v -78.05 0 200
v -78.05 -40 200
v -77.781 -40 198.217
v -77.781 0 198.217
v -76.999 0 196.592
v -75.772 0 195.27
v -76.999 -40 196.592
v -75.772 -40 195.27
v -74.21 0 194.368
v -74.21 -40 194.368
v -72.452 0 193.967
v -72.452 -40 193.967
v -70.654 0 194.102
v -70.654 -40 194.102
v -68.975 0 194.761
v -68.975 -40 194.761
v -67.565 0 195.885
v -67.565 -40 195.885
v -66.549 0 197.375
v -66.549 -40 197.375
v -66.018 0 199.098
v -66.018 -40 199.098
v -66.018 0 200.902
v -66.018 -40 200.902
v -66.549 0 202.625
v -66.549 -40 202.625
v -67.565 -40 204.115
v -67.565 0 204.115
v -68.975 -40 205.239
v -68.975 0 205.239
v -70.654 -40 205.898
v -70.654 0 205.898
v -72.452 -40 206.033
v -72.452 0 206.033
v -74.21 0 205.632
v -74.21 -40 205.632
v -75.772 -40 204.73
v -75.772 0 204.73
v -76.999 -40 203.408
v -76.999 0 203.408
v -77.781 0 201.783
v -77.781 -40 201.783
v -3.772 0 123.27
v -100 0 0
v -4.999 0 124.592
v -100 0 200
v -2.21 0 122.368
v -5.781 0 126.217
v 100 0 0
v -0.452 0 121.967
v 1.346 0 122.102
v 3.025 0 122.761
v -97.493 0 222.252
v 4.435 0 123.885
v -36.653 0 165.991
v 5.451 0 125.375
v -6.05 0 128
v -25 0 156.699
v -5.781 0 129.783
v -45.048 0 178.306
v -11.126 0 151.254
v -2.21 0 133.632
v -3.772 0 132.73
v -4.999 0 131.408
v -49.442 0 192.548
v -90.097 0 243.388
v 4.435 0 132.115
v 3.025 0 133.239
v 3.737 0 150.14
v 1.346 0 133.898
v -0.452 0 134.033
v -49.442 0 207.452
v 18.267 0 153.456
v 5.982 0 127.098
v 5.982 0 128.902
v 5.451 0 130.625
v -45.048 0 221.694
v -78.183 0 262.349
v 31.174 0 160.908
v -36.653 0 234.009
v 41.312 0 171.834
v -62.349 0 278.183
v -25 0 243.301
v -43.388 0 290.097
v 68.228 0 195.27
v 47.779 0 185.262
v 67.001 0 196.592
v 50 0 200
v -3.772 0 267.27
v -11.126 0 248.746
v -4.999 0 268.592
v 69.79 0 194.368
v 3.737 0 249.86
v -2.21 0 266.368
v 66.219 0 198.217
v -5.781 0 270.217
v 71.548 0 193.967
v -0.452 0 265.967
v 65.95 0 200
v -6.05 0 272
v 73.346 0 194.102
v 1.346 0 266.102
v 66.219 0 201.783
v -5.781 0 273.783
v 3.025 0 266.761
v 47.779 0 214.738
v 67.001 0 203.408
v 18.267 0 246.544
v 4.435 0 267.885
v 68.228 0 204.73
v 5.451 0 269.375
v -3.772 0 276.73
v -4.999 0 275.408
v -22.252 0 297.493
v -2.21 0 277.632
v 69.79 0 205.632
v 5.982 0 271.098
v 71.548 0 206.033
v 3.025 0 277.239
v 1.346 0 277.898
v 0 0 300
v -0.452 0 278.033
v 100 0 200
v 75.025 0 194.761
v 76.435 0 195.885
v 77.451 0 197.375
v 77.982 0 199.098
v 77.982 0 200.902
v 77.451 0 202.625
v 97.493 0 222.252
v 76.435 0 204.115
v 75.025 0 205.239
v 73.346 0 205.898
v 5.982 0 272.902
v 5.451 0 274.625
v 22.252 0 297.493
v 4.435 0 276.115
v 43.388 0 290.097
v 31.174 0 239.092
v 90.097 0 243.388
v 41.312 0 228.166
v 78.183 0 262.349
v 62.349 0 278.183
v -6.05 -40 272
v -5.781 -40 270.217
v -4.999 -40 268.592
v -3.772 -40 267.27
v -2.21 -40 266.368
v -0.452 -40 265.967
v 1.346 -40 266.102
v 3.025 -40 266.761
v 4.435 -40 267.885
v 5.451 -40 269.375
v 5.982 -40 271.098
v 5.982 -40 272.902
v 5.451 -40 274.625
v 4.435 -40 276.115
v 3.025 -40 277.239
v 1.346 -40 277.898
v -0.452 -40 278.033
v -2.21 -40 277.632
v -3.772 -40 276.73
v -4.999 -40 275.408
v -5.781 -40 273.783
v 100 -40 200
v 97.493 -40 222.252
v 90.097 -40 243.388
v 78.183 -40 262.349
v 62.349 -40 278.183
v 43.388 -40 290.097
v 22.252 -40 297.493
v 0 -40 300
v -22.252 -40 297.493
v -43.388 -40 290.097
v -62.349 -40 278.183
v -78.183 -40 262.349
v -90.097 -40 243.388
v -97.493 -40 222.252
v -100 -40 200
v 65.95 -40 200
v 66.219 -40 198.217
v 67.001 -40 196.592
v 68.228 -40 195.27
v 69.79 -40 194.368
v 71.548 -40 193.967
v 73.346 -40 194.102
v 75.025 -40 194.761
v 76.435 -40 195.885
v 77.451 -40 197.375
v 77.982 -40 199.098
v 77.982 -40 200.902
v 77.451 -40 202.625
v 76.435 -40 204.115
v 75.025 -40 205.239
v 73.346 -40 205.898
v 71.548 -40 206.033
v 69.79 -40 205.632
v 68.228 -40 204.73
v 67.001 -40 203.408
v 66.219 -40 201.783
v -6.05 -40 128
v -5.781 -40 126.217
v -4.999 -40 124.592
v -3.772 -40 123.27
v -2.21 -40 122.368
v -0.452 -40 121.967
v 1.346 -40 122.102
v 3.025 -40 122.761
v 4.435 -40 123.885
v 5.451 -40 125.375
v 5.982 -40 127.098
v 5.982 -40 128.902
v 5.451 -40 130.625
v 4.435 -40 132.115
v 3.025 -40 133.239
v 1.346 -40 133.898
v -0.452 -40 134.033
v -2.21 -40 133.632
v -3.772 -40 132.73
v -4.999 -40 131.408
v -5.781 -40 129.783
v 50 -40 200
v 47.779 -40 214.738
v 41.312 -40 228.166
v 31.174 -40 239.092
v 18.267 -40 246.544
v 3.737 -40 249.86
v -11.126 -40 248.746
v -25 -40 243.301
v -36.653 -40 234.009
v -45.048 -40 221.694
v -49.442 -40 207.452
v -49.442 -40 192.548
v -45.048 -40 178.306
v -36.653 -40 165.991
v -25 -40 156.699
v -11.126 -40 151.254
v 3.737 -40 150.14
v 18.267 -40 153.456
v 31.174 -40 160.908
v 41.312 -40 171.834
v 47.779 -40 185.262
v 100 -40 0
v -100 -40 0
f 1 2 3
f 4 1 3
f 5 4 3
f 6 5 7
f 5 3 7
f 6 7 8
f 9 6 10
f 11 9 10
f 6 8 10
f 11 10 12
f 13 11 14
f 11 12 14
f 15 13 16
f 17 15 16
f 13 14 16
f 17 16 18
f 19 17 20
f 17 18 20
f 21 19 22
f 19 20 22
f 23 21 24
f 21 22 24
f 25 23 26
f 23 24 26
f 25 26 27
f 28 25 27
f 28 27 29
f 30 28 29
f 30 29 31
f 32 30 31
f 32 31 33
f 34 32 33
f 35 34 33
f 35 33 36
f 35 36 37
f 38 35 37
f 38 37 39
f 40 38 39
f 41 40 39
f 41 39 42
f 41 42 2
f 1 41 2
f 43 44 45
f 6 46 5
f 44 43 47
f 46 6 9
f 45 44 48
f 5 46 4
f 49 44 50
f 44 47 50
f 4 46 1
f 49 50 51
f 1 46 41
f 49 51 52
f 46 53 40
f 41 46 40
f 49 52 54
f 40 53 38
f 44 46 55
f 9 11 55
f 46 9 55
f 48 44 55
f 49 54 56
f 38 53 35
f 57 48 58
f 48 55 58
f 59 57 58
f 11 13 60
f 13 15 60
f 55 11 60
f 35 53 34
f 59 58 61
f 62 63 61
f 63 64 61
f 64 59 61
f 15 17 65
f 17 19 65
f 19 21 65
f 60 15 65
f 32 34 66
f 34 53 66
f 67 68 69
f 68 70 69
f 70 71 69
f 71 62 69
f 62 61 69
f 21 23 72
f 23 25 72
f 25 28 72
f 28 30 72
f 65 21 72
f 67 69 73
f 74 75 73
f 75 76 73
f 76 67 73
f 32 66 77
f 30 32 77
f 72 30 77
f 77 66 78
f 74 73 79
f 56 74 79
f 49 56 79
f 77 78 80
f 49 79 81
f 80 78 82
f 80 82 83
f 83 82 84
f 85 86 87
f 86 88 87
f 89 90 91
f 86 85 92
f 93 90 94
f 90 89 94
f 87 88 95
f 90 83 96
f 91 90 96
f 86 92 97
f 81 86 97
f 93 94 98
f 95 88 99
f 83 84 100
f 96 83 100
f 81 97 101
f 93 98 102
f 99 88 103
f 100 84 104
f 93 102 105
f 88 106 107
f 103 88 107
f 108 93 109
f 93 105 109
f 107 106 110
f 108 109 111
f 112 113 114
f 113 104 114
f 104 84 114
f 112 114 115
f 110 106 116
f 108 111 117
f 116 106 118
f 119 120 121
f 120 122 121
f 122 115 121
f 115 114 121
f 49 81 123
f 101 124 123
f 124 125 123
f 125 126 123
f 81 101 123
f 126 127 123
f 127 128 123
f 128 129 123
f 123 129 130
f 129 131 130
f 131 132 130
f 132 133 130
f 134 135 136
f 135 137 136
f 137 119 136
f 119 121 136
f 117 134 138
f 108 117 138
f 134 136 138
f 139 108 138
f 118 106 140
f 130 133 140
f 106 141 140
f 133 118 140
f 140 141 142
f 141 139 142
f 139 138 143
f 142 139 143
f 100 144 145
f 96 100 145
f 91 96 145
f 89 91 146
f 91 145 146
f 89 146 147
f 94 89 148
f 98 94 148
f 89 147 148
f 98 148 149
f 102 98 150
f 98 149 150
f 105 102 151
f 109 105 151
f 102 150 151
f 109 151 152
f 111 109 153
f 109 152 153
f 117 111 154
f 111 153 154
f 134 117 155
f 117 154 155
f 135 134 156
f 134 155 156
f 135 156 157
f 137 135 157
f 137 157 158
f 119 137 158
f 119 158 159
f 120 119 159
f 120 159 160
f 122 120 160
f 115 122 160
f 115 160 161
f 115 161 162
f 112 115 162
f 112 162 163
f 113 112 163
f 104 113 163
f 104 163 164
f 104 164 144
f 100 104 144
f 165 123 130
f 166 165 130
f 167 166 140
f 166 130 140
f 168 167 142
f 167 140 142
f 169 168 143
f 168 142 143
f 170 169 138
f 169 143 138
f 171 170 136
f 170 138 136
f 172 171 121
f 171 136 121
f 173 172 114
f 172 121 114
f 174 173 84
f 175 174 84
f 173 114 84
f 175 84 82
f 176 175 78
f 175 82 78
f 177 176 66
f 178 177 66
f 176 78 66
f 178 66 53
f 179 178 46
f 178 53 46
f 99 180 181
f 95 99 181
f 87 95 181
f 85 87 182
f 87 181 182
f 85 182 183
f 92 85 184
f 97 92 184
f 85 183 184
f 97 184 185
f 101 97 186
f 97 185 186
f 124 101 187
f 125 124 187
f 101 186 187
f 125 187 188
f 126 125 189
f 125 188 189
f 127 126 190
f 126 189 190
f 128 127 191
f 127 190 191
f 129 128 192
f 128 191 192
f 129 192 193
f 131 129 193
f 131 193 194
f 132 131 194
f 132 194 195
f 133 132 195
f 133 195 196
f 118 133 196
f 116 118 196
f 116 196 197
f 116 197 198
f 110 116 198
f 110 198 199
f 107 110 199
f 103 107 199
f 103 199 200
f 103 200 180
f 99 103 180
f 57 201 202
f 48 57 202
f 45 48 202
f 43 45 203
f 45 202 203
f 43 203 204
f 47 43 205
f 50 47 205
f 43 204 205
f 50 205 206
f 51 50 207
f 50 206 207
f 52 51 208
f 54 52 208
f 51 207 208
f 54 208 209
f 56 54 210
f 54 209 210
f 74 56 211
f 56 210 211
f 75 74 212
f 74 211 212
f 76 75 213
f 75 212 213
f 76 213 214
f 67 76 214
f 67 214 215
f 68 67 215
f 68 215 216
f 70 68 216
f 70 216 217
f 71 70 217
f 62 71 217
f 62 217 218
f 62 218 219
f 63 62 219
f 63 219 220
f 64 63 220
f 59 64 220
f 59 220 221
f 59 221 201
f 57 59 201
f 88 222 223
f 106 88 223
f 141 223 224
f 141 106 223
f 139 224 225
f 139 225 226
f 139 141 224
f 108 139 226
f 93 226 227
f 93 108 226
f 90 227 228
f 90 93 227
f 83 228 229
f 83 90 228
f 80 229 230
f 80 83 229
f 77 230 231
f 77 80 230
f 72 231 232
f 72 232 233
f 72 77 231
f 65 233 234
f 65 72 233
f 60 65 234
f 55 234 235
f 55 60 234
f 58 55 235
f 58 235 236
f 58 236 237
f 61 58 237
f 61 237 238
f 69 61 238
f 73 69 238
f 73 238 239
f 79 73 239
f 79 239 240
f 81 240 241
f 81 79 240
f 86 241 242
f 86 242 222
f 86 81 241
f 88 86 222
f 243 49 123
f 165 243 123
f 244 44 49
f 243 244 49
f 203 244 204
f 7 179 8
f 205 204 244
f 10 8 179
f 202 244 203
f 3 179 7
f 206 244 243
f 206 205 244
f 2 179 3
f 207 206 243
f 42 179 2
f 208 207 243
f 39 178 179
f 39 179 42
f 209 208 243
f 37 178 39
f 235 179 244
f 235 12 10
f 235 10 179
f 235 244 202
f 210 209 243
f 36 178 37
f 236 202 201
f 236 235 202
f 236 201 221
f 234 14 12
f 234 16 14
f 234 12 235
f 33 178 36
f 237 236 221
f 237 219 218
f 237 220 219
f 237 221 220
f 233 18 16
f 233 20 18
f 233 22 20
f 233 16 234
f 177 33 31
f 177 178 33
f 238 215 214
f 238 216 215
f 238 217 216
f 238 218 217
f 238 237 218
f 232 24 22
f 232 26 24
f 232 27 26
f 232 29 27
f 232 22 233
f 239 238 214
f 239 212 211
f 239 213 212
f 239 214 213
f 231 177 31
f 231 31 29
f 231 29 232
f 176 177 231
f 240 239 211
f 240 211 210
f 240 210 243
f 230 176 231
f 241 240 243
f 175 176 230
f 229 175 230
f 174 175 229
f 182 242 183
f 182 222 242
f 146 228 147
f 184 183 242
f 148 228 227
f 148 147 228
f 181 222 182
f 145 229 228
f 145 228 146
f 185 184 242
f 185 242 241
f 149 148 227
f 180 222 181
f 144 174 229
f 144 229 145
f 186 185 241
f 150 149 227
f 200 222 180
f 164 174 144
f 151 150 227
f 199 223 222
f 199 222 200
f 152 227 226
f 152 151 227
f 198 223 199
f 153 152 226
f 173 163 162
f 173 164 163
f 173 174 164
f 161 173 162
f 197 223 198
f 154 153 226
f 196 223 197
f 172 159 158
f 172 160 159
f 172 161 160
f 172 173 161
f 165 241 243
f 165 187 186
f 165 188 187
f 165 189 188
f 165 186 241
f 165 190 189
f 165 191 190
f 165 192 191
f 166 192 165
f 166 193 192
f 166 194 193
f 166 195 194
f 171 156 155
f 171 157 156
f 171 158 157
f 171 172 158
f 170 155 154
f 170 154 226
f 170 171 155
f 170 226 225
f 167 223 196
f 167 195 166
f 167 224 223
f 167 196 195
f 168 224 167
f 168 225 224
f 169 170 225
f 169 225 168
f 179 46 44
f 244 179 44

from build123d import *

# Parameters (mm, degrees)
F0_W     = 200
F0_H     = 40
F0_R     = 50
F1_DEPTH = 40
F2_D     = 12.1


with BuildPart() as f1:
    # F0 (on Front) → F1 (new body)
    with BuildSketch(Plane.XZ):
        with Locations((0, 20)):
            Rectangle(F0_W, F0_H)
        with BuildLine():
            Line((-100, 200), (-100, 40))
            Line((-100, 40), (100, 40))
            Line((100, 40), (100, 200))
            ThreePointArc((100, 200), (0, 300), (-100, 200))
        make_face()
        with Locations((0, 200)):
            Circle(F0_R, mode=Mode.SUBTRACT)
    extrude(amount=F1_DEPTH)

    # F2 (through all)
    with Locations(Plane(origin=(0, 0, 0), x_dir=(1, 0, 0), z_dir=(0, 1, 0))):
        with Locations((0, -272), (-72, -200), (0, -128), (72, -200)):
            Hole(F2_D / 2)


solid = f1.part
